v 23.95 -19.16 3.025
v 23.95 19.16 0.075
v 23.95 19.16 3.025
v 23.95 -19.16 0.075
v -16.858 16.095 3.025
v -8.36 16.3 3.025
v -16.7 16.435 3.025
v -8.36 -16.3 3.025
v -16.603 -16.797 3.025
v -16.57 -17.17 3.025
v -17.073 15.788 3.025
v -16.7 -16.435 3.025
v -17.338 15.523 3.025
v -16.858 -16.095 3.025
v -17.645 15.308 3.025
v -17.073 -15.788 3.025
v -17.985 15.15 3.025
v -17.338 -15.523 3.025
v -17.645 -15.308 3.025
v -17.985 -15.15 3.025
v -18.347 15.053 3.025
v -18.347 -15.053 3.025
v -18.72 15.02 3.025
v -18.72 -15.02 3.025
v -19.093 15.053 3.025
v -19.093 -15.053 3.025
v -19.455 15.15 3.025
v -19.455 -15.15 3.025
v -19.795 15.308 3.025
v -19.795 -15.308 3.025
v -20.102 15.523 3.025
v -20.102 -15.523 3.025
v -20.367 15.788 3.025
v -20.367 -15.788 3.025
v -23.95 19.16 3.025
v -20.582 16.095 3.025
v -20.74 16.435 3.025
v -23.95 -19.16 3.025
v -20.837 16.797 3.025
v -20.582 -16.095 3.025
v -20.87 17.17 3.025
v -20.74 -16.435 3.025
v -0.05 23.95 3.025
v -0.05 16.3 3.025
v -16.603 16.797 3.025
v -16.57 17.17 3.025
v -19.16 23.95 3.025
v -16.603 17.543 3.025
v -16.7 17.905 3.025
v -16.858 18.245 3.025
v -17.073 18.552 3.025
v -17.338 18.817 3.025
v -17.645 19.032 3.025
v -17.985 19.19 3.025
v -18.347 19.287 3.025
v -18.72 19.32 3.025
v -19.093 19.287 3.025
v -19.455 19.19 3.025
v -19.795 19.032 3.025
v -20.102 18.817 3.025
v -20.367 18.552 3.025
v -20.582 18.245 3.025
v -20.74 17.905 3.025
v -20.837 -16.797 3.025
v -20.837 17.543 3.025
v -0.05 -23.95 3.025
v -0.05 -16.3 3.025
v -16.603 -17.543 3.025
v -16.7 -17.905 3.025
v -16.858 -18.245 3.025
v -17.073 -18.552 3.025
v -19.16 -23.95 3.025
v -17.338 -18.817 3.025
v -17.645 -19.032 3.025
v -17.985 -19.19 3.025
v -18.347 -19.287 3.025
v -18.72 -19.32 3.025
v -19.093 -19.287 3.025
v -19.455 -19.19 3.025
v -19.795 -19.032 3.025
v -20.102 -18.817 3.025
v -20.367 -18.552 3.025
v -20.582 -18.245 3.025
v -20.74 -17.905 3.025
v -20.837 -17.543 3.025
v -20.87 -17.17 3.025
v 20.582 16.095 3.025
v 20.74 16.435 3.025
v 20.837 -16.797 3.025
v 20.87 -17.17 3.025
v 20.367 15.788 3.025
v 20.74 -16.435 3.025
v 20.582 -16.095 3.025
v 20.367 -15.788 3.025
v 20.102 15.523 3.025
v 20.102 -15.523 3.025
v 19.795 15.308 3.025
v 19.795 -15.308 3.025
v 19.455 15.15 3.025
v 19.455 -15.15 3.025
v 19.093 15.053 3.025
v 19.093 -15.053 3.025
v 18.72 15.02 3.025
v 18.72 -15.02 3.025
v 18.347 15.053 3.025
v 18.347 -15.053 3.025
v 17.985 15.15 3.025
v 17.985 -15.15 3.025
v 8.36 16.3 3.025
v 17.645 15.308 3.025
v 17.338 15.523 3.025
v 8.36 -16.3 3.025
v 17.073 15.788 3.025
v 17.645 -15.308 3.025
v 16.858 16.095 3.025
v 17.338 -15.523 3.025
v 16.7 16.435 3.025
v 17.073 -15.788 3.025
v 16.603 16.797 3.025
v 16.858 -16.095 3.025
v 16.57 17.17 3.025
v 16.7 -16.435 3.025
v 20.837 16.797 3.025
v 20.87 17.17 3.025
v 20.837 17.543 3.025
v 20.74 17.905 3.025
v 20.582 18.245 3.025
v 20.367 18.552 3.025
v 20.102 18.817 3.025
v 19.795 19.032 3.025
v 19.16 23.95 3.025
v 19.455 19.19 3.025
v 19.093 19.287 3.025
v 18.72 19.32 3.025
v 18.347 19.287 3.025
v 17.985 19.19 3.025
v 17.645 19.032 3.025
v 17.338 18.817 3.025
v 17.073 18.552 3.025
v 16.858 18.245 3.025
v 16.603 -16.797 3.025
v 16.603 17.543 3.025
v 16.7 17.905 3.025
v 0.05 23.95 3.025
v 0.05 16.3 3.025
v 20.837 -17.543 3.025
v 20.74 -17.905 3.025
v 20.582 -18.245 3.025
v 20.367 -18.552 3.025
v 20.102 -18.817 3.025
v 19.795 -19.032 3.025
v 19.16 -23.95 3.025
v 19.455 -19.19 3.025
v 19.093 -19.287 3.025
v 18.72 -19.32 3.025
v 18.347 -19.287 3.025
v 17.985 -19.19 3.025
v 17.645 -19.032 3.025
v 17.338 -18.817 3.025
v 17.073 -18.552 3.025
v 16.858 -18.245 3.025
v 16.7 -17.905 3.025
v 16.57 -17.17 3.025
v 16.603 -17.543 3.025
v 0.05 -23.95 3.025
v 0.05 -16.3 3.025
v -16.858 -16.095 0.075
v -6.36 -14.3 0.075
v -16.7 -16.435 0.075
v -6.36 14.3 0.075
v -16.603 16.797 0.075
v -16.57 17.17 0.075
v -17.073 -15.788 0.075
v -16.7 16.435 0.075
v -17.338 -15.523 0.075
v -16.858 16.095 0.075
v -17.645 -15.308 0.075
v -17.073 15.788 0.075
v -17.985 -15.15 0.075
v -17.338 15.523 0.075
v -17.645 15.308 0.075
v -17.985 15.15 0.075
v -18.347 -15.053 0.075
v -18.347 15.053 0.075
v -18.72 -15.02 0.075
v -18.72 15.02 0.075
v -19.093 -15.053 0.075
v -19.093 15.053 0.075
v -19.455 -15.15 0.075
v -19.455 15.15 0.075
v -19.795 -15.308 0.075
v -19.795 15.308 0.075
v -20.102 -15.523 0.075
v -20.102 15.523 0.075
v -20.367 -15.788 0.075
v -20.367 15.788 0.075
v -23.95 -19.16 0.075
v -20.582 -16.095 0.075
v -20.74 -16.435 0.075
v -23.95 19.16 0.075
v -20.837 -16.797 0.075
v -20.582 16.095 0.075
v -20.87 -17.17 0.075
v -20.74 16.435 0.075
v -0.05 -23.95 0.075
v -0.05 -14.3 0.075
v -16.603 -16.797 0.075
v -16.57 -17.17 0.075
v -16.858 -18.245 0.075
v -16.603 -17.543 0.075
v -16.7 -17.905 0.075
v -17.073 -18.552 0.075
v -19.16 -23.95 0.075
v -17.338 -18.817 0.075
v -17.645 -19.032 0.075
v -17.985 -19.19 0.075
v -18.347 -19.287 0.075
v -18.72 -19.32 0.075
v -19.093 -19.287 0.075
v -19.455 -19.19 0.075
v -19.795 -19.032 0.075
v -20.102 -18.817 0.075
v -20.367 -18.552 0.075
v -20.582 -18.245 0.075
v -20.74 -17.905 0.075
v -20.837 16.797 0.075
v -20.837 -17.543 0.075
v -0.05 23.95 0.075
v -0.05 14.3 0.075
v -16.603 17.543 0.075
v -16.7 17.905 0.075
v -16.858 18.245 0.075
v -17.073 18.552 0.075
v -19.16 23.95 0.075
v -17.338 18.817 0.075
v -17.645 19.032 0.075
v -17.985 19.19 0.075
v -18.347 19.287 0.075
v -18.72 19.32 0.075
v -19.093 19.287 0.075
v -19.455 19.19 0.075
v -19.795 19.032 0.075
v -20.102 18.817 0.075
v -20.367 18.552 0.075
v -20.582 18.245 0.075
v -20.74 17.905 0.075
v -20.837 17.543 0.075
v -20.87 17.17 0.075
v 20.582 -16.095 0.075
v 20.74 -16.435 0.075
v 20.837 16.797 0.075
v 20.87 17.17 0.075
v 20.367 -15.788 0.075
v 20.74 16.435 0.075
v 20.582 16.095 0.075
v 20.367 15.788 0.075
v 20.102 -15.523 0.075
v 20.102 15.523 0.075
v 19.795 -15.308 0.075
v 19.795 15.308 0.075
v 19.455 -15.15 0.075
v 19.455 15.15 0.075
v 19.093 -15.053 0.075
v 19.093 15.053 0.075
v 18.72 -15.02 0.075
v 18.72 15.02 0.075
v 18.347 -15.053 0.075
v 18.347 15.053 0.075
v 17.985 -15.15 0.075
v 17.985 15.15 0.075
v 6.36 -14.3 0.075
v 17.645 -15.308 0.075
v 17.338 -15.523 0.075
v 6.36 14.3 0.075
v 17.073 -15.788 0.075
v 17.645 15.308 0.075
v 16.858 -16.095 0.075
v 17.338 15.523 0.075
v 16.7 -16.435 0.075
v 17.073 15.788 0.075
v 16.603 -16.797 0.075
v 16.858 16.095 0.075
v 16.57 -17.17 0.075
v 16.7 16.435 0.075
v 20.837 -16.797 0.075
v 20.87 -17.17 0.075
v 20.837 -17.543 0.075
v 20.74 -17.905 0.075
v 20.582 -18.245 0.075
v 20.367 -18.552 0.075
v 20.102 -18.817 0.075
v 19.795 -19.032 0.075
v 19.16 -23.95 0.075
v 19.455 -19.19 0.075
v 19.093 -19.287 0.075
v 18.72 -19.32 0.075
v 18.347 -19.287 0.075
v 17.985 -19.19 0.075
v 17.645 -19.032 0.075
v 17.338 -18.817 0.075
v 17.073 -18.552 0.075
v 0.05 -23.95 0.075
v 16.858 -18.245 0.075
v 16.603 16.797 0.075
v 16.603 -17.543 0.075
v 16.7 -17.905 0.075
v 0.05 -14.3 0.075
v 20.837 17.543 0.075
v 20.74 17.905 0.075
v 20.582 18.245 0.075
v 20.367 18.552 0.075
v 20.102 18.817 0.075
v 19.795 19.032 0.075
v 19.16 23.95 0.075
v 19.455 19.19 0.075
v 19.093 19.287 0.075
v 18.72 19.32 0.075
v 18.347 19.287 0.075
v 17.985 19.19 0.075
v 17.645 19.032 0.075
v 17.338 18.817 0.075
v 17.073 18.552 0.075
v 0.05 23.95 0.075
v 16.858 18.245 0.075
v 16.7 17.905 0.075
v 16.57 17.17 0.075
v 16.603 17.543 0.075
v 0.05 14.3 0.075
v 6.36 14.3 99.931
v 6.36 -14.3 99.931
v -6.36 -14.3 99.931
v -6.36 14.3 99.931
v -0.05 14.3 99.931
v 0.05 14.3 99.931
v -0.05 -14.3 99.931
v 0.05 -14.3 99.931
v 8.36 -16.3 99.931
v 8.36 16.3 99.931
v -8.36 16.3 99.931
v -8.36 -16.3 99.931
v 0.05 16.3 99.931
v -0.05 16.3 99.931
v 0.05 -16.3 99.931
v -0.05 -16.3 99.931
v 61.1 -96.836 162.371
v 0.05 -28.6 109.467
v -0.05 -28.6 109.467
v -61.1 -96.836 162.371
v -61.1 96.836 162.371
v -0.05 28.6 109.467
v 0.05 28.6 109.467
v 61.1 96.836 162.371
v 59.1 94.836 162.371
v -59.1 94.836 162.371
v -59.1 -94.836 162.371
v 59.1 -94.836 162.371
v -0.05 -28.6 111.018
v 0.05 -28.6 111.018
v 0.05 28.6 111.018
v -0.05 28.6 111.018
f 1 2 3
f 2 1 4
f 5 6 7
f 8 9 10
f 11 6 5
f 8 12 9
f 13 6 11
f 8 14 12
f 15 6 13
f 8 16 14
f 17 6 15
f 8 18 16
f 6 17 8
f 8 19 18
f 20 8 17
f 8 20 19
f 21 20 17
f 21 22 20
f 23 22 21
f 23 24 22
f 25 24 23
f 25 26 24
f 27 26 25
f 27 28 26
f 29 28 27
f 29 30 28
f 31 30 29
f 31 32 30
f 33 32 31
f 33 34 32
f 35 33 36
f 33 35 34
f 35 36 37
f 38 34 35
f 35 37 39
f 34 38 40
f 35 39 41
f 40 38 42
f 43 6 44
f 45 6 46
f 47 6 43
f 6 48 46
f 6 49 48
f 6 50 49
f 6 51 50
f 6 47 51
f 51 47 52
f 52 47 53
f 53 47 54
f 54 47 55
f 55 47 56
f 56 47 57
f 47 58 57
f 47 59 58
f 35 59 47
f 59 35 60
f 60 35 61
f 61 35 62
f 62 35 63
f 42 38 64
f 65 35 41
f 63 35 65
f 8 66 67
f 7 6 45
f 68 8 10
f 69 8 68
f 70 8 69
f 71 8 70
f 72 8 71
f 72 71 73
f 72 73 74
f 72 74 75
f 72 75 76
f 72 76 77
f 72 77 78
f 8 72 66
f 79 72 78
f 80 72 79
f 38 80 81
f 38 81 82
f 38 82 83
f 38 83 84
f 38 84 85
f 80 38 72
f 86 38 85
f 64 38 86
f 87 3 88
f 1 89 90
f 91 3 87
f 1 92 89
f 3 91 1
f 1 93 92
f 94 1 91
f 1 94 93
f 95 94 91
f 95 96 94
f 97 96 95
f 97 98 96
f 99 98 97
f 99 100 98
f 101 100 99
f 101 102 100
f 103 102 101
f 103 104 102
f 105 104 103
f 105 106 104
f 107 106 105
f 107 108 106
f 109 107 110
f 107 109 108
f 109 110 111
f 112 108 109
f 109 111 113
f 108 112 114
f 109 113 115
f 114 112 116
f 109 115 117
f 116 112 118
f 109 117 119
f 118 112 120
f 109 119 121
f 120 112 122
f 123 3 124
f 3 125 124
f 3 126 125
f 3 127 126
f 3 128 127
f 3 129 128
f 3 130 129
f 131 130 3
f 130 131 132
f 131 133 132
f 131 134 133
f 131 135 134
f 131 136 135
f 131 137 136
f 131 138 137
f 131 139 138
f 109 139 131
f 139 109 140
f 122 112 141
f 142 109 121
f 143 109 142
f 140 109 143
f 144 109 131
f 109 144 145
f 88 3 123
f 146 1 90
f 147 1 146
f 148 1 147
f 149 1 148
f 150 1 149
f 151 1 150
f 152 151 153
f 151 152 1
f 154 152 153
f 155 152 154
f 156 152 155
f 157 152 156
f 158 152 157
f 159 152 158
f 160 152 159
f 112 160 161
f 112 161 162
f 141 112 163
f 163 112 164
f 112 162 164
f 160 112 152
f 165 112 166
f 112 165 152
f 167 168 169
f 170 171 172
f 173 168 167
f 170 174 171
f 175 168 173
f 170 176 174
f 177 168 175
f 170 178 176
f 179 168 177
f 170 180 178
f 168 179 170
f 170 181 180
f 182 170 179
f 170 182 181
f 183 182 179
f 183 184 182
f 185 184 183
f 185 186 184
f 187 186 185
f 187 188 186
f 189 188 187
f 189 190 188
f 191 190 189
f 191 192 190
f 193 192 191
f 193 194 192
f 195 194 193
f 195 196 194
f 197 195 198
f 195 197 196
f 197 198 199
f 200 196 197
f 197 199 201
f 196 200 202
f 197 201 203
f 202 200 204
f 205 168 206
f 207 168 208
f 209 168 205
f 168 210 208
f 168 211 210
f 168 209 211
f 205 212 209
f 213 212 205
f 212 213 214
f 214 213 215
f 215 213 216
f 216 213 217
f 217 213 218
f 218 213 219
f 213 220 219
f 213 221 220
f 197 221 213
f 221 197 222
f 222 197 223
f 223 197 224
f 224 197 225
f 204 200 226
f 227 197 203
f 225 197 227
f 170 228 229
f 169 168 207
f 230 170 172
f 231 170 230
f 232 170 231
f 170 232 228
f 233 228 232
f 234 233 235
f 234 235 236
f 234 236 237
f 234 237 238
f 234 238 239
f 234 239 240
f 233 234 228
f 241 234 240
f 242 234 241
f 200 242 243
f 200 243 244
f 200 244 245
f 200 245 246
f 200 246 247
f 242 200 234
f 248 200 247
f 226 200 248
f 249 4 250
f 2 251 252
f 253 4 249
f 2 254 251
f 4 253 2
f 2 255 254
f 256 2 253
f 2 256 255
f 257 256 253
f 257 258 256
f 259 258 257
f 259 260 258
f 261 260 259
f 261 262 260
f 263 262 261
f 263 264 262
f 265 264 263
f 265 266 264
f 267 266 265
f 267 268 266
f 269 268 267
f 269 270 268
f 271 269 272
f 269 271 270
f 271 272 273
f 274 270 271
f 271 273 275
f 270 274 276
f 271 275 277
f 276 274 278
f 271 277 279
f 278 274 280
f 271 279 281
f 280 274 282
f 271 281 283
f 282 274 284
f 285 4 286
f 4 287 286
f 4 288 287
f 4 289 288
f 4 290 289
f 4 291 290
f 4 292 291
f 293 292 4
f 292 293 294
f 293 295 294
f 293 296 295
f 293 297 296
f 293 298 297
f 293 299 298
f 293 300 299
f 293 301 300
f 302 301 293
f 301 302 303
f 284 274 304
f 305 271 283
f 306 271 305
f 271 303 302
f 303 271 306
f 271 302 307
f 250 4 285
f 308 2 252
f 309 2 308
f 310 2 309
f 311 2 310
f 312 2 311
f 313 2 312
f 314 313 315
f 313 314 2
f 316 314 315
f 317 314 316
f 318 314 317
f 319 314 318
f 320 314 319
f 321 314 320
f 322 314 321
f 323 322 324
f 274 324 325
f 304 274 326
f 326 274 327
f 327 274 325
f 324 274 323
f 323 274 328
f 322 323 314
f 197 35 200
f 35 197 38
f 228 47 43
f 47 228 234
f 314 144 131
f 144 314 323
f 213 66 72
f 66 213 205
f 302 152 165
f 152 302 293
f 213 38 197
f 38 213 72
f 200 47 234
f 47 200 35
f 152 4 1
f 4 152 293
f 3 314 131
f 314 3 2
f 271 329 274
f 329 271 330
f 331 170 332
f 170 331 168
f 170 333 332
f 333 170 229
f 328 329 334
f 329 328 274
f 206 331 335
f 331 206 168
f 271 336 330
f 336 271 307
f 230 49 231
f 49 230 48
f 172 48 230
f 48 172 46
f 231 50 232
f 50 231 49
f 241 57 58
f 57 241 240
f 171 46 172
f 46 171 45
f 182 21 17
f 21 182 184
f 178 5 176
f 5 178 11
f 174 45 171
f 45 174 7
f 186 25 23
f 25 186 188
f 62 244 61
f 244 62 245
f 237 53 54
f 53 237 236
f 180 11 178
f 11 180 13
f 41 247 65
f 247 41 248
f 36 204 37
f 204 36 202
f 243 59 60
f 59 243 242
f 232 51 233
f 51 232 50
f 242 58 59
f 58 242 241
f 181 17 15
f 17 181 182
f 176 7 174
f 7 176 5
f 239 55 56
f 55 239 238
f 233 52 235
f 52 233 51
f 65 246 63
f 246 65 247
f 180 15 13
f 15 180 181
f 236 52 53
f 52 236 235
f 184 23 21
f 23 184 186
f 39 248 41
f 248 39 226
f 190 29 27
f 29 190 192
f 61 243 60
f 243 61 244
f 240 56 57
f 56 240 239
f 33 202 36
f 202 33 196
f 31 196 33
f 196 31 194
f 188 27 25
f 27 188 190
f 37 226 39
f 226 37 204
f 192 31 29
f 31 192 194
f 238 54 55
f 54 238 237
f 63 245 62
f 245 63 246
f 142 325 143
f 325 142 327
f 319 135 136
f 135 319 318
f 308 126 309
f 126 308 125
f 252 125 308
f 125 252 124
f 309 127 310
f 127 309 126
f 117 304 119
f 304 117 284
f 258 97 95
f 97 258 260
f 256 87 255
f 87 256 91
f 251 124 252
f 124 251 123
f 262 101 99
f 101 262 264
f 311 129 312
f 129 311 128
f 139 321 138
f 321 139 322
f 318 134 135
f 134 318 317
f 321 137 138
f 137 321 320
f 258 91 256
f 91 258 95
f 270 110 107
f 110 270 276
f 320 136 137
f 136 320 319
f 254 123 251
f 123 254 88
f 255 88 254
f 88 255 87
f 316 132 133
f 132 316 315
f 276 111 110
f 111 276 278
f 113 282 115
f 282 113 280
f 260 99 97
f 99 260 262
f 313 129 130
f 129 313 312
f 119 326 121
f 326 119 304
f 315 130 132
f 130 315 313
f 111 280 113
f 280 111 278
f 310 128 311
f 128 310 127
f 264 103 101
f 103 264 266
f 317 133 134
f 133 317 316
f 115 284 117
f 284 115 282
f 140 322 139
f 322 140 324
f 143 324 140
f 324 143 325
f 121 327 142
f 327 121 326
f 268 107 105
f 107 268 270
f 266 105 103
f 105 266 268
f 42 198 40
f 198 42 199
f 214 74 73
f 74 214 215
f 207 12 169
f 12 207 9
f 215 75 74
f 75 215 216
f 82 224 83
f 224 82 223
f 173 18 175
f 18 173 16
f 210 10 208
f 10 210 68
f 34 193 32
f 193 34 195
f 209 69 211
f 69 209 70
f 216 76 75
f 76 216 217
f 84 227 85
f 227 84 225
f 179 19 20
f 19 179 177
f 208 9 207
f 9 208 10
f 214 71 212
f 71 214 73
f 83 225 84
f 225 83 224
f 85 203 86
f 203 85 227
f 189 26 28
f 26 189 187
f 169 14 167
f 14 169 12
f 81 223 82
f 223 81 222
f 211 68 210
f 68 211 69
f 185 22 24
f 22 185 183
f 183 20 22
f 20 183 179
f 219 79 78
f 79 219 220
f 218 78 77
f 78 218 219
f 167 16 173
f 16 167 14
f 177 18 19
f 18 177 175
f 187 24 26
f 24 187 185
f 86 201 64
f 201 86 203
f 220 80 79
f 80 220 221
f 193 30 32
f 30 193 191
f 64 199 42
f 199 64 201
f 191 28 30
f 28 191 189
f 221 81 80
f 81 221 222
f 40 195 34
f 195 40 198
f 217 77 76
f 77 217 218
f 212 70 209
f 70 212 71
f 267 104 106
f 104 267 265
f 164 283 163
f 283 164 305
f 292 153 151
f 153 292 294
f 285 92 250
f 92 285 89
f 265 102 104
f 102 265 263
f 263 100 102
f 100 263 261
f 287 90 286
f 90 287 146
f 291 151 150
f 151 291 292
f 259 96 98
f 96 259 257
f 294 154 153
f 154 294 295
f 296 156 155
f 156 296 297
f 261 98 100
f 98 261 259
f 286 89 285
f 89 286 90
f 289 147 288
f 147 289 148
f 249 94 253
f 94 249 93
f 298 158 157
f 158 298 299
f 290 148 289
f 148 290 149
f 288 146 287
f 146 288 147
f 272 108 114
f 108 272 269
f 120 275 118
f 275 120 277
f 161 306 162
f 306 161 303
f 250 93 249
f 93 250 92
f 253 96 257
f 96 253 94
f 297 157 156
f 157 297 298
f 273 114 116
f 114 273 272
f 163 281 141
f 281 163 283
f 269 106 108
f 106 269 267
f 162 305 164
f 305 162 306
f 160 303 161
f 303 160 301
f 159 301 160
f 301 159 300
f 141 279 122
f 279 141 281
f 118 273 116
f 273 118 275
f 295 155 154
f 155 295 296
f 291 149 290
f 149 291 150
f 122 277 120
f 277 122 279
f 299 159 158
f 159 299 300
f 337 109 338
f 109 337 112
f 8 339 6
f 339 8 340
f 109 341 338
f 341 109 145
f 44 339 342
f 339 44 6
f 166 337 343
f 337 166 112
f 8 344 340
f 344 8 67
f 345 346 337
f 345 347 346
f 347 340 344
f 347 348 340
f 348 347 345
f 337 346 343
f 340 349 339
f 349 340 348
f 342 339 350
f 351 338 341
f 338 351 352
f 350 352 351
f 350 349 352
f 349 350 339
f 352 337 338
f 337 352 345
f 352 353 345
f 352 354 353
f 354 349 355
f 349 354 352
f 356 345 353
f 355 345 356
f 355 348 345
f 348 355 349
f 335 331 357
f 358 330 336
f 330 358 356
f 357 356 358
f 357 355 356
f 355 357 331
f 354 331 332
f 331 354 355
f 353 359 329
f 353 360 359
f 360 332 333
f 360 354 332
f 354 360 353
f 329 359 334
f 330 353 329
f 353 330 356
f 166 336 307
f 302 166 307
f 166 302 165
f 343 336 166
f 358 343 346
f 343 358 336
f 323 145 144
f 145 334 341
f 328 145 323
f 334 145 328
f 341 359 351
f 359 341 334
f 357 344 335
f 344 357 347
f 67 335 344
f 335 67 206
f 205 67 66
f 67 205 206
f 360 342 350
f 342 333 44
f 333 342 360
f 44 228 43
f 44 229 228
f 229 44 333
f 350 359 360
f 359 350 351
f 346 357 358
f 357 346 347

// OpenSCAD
// file: common.scad
/**********************************************************************
 * Common waveguide code                                              *
 * NOTE: Must be included AFTER setting waveguide parameters          *
 * Perhaps in the future it could be useful to allow passing in these *
 * parameters to the modules themselves, removing this requirement.   *
 **********************************************************************/


/*             WR112   WR90   WR75   WR62   WR51   WR42   WR34  WR28 */
wrtab    = [0, 112,    90,    75,    62,    51,    42,    34,   28   ]*1.0; /* Waveguide type */
fstab    = [0,  47.9,  41.4,  38.3,  33.3,  31.0,  22.41, 22.1, 19.05]*1.0; /* Flange size */
fhstab   = [0,  18.72, 16.26, 14.25, 12.14, 11.25,  8.51,  7.9,  6.73]*1.0; /* Hole spacing short side */
fhltab   = [0,  17.17, 15.49, 13.21, 12.63, 10.29,  8.13,  7.5,  6.34]*1.0; /* Hole spacing long side */
drilltab = [0,   4.3,   4.3,   4.1,   4.1,   4.1,   3.1,   3.1,  3.0 ]*1.0; /* Hole size */
/* Not all waveguide opening sizes correspong 100% to the waveguide number */
wgatab   = [0,  28.50, 22.86, 19.05, 15.80, 12.95, 10.67,  8.64, 7.11]*1.0; /* Waveguide opening size A */
wgbtab   = [0,  12.62, 10.16,  9.53,  7.90,  6.48,  4.32,  4.32, 3.56]*1.0; /* Waveguide opening size B */


flange_size   = fstab[wrcode];        /* Square size of flange */
flange_hole_s = fhstab[wrcode];       /* Hole spacing on short side */
flange_hole_l = fhltab[wrcode];       /* Hole spacing on long side */
flange_drill  = drilltab[wrcode]/2.0; /* Flange mounting hole size */

wgsize_a = wgatab[wrcode] + (trim * 2);
wgsize_b = wgbtab[wrcode] + (trim * 2);

// faces for precision
$fn=36; // faces for precision

/* Create a waveguide flange
 *   Heavily based on code from Rolf-Dieter Klein (www.rdklein.de)
 *   https://www.thingiverse.com/thing:161428
 */
module flange() {
    thickness = flanged - trim;

    difference() {
        difference() {
            intersection() {
                cube([flange_size, flange_size, thickness], center=true);
                rotate([0,0,45])
                    cube([flange_size*1.4142*0.9,flange_size*1.4142*0.9,thickness],center=true);
            }
            cube([wgsize_b,wgsize_a,wall*2],center=true);
        }
        /* Holes */
        translate([-flange_hole_s,  flange_hole_l, 0]) cylinder(h=thickness*1.1, r=flange_drill, center=true);
        translate([ flange_hole_s,  flange_hole_l, 0]) cylinder(h=thickness*1.1, r=flange_drill, center=true);
        translate([-flange_hole_s, -flange_hole_l, 0]) cylinder(h=thickness*1.1, r=flange_drill, center=true);
        translate([ flange_hole_s, -flange_hole_l, 0]) cylinder(h=thickness*1.1, r=flange_drill, center=true);
    }
}

/* Create a flangeless section of waveguide
 *   wg_len: Length of section, in mm
 */
module waveguide(wg_len) {
    translate([0,0,wg_len/2]) {
        difference() {
            cube([wgsize_b+wall*2, wgsize_a+wall*2, wg_len],          center=true);
            cube([wgsize_b,        wgsize_a,        wg_len + wall*.1],center=true);
        }
    }
}

/* Generate horn antenna
 *   length:  Length of horn
 *   theta_h: Angle of horn in magnetic field
 *   theta_e: Angle of horn in electric field
 *
 * Polyhedron code loosely based off of code from Rolf-Dieter Klein (www.rdklein.de)
 *   https://www.thingiverse.com/thing:161428
 */
module horn(length, theta_h, theta_e) {
    /* Depth of horn that ends up inside waveguide */
    d_a = wgsize_a / (2 * tan(theta_h));
    d_b = wgsize_b / (2 * tan(theta_e));

    /* Size of horn opening */
    sz_a = wgsize_a + (2 * length * tan(theta_h));
    sz_b = wgsize_b + (2 * length * tan(theta_e));

    difference() {
        polyhedron(
            points = [
                /* Wide end */
                [ sz_b/2 + wall,  sz_a/2 + wall, length],
                [ sz_b/2 + wall, -sz_a/2 - wall, length],
                [-sz_b/2 - wall, -sz_a/2 - wall, length],
                [-sz_b/2 - wall,  sz_a/2 + wall, length],
                /* Small end */
                [ wgsize_b/2 + wall,  wgsize_a/2 + wall, 0],
                [ wgsize_b/2 + wall, -wgsize_a/2 - wall, 0],
                [-wgsize_b/2 - wall, -wgsize_a/2 - wall, 0],
                [-wgsize_b/2 - wall,  wgsize_a/2 + wall, 0]
            ],
            faces = [
                [0,1,4],[1,2,5],[2,3,6],[3,0,7],
                [1,5,4],[2,6,5],[3,7,6],[0,4,7],
                [1,0,3],[2,1,3],[4,5,7],[5,6,7]
            ]
        );
        polyhedron(
            points = [
                /* Wide end */
                [ sz_b/2,  sz_a/2, length],
                [ sz_b/2, -sz_a/2, length],
                [-sz_b/2, -sz_a/2, length],
                [-sz_b/2,  sz_a/2, length],
                /* Small end */
                [ wgsize_b/2,  wgsize_a/2, 0],
                [ wgsize_b/2, -wgsize_a/2, 0],
                [-wgsize_b/2, -wgsize_a/2, 0],
                [-wgsize_b/2,  wgsize_a/2, 0]
            ],
            faces = [
                [0,1,4],[1,2,5],[2,3,6],[3,0,7],
                [1,5,4],[2,6,5],[3,7,6],[0,4,7],
                [1,0,3],[2,1,3],[4,5,7],[5,6,7]
            ]
        );
    }
}

/* Generate an ideal horn antenna for a given wavelength
 *   l_h: Length of horn in magnetic field direction
 *   l_e: Length of horn in electric field direction
 *   wavelength: Design wavelength
 *
 * Both l_h and l_e include the portion of the antenna that would end up inside
 * the waveguide if both sides of the horn were extended until they meet.
 */
module ideal_horn(l_h, l_e, wavelength) {
    theta_e = asin(sqrt(2 * wavelength * l_e) / (2 * l_e));
    theta_h = asin(sqrt(3 * wavelength * l_h) / (2 * l_h));

    /* Not sure if min is good, but whatever. Maybe I should rewrite this to just produce the horn directly */
    length_e = (l_e * cos(theta_e)) - (wgsize_b / (2 * tan(theta_e)));
    length_h = (l_h * cos(theta_h)) - (wgsize_a / (2 * tan(theta_h)));
    echo("Len_E: ", length_e, "Len_H", length_h);
    length = min(length_e, length_h);

    horn(length, theta_h, theta_e);
}
// main file
/************************************
 * Waveguide horn antenna generator *
 ************************************/


/* Waveguide selection */
wrcode = 1;

/* Waveguide wall thickness */
wall = 2;

/* Flange thickness */
flanged = 3;

/* Length of waveguide section, including flanges */
length = 20;

/* Amount to trim back internal and mating surfaces, for the purpose of accounting for metallic tape or coating. */
trim = 0.05;

/* Length of horn, in wavelengths */
horn_len = 2;

/* Design frequency, in GHz */
design_freq = 3;

function ghz_to_mm(freq) = (299.792458 / freq);

design_wavelen = ghz_to_mm(design_freq);

/* Length of waveguide, including flange, feeding horn */
feed_len = 1 * design_wavelen;

/* Set to 1 to split horn along short side of section. This can make coating inside of waveguide much easier. */
split_part = 1;



/******************************************************************************/

/* Import waveguide components */
include <common.scad>

difference() {
    union() {
        translate([0, 0, (flanged / 2) + trim])
            flange();

        translate([0, 0, flanged - 0.0001])
            waveguide((feed_len - flanged) + 0.0002);

        translate([0, 0, feed_len])
            //horn(30, 30, 30);
            ideal_horn(120, 120, design_wavelen);
    }

    if(split_part) {
        translate([-trim, -wgsize_a, -flanged])
            cube([trim * 2, wgsize_a*2, (feed_len+length)*3]);
    }
}
